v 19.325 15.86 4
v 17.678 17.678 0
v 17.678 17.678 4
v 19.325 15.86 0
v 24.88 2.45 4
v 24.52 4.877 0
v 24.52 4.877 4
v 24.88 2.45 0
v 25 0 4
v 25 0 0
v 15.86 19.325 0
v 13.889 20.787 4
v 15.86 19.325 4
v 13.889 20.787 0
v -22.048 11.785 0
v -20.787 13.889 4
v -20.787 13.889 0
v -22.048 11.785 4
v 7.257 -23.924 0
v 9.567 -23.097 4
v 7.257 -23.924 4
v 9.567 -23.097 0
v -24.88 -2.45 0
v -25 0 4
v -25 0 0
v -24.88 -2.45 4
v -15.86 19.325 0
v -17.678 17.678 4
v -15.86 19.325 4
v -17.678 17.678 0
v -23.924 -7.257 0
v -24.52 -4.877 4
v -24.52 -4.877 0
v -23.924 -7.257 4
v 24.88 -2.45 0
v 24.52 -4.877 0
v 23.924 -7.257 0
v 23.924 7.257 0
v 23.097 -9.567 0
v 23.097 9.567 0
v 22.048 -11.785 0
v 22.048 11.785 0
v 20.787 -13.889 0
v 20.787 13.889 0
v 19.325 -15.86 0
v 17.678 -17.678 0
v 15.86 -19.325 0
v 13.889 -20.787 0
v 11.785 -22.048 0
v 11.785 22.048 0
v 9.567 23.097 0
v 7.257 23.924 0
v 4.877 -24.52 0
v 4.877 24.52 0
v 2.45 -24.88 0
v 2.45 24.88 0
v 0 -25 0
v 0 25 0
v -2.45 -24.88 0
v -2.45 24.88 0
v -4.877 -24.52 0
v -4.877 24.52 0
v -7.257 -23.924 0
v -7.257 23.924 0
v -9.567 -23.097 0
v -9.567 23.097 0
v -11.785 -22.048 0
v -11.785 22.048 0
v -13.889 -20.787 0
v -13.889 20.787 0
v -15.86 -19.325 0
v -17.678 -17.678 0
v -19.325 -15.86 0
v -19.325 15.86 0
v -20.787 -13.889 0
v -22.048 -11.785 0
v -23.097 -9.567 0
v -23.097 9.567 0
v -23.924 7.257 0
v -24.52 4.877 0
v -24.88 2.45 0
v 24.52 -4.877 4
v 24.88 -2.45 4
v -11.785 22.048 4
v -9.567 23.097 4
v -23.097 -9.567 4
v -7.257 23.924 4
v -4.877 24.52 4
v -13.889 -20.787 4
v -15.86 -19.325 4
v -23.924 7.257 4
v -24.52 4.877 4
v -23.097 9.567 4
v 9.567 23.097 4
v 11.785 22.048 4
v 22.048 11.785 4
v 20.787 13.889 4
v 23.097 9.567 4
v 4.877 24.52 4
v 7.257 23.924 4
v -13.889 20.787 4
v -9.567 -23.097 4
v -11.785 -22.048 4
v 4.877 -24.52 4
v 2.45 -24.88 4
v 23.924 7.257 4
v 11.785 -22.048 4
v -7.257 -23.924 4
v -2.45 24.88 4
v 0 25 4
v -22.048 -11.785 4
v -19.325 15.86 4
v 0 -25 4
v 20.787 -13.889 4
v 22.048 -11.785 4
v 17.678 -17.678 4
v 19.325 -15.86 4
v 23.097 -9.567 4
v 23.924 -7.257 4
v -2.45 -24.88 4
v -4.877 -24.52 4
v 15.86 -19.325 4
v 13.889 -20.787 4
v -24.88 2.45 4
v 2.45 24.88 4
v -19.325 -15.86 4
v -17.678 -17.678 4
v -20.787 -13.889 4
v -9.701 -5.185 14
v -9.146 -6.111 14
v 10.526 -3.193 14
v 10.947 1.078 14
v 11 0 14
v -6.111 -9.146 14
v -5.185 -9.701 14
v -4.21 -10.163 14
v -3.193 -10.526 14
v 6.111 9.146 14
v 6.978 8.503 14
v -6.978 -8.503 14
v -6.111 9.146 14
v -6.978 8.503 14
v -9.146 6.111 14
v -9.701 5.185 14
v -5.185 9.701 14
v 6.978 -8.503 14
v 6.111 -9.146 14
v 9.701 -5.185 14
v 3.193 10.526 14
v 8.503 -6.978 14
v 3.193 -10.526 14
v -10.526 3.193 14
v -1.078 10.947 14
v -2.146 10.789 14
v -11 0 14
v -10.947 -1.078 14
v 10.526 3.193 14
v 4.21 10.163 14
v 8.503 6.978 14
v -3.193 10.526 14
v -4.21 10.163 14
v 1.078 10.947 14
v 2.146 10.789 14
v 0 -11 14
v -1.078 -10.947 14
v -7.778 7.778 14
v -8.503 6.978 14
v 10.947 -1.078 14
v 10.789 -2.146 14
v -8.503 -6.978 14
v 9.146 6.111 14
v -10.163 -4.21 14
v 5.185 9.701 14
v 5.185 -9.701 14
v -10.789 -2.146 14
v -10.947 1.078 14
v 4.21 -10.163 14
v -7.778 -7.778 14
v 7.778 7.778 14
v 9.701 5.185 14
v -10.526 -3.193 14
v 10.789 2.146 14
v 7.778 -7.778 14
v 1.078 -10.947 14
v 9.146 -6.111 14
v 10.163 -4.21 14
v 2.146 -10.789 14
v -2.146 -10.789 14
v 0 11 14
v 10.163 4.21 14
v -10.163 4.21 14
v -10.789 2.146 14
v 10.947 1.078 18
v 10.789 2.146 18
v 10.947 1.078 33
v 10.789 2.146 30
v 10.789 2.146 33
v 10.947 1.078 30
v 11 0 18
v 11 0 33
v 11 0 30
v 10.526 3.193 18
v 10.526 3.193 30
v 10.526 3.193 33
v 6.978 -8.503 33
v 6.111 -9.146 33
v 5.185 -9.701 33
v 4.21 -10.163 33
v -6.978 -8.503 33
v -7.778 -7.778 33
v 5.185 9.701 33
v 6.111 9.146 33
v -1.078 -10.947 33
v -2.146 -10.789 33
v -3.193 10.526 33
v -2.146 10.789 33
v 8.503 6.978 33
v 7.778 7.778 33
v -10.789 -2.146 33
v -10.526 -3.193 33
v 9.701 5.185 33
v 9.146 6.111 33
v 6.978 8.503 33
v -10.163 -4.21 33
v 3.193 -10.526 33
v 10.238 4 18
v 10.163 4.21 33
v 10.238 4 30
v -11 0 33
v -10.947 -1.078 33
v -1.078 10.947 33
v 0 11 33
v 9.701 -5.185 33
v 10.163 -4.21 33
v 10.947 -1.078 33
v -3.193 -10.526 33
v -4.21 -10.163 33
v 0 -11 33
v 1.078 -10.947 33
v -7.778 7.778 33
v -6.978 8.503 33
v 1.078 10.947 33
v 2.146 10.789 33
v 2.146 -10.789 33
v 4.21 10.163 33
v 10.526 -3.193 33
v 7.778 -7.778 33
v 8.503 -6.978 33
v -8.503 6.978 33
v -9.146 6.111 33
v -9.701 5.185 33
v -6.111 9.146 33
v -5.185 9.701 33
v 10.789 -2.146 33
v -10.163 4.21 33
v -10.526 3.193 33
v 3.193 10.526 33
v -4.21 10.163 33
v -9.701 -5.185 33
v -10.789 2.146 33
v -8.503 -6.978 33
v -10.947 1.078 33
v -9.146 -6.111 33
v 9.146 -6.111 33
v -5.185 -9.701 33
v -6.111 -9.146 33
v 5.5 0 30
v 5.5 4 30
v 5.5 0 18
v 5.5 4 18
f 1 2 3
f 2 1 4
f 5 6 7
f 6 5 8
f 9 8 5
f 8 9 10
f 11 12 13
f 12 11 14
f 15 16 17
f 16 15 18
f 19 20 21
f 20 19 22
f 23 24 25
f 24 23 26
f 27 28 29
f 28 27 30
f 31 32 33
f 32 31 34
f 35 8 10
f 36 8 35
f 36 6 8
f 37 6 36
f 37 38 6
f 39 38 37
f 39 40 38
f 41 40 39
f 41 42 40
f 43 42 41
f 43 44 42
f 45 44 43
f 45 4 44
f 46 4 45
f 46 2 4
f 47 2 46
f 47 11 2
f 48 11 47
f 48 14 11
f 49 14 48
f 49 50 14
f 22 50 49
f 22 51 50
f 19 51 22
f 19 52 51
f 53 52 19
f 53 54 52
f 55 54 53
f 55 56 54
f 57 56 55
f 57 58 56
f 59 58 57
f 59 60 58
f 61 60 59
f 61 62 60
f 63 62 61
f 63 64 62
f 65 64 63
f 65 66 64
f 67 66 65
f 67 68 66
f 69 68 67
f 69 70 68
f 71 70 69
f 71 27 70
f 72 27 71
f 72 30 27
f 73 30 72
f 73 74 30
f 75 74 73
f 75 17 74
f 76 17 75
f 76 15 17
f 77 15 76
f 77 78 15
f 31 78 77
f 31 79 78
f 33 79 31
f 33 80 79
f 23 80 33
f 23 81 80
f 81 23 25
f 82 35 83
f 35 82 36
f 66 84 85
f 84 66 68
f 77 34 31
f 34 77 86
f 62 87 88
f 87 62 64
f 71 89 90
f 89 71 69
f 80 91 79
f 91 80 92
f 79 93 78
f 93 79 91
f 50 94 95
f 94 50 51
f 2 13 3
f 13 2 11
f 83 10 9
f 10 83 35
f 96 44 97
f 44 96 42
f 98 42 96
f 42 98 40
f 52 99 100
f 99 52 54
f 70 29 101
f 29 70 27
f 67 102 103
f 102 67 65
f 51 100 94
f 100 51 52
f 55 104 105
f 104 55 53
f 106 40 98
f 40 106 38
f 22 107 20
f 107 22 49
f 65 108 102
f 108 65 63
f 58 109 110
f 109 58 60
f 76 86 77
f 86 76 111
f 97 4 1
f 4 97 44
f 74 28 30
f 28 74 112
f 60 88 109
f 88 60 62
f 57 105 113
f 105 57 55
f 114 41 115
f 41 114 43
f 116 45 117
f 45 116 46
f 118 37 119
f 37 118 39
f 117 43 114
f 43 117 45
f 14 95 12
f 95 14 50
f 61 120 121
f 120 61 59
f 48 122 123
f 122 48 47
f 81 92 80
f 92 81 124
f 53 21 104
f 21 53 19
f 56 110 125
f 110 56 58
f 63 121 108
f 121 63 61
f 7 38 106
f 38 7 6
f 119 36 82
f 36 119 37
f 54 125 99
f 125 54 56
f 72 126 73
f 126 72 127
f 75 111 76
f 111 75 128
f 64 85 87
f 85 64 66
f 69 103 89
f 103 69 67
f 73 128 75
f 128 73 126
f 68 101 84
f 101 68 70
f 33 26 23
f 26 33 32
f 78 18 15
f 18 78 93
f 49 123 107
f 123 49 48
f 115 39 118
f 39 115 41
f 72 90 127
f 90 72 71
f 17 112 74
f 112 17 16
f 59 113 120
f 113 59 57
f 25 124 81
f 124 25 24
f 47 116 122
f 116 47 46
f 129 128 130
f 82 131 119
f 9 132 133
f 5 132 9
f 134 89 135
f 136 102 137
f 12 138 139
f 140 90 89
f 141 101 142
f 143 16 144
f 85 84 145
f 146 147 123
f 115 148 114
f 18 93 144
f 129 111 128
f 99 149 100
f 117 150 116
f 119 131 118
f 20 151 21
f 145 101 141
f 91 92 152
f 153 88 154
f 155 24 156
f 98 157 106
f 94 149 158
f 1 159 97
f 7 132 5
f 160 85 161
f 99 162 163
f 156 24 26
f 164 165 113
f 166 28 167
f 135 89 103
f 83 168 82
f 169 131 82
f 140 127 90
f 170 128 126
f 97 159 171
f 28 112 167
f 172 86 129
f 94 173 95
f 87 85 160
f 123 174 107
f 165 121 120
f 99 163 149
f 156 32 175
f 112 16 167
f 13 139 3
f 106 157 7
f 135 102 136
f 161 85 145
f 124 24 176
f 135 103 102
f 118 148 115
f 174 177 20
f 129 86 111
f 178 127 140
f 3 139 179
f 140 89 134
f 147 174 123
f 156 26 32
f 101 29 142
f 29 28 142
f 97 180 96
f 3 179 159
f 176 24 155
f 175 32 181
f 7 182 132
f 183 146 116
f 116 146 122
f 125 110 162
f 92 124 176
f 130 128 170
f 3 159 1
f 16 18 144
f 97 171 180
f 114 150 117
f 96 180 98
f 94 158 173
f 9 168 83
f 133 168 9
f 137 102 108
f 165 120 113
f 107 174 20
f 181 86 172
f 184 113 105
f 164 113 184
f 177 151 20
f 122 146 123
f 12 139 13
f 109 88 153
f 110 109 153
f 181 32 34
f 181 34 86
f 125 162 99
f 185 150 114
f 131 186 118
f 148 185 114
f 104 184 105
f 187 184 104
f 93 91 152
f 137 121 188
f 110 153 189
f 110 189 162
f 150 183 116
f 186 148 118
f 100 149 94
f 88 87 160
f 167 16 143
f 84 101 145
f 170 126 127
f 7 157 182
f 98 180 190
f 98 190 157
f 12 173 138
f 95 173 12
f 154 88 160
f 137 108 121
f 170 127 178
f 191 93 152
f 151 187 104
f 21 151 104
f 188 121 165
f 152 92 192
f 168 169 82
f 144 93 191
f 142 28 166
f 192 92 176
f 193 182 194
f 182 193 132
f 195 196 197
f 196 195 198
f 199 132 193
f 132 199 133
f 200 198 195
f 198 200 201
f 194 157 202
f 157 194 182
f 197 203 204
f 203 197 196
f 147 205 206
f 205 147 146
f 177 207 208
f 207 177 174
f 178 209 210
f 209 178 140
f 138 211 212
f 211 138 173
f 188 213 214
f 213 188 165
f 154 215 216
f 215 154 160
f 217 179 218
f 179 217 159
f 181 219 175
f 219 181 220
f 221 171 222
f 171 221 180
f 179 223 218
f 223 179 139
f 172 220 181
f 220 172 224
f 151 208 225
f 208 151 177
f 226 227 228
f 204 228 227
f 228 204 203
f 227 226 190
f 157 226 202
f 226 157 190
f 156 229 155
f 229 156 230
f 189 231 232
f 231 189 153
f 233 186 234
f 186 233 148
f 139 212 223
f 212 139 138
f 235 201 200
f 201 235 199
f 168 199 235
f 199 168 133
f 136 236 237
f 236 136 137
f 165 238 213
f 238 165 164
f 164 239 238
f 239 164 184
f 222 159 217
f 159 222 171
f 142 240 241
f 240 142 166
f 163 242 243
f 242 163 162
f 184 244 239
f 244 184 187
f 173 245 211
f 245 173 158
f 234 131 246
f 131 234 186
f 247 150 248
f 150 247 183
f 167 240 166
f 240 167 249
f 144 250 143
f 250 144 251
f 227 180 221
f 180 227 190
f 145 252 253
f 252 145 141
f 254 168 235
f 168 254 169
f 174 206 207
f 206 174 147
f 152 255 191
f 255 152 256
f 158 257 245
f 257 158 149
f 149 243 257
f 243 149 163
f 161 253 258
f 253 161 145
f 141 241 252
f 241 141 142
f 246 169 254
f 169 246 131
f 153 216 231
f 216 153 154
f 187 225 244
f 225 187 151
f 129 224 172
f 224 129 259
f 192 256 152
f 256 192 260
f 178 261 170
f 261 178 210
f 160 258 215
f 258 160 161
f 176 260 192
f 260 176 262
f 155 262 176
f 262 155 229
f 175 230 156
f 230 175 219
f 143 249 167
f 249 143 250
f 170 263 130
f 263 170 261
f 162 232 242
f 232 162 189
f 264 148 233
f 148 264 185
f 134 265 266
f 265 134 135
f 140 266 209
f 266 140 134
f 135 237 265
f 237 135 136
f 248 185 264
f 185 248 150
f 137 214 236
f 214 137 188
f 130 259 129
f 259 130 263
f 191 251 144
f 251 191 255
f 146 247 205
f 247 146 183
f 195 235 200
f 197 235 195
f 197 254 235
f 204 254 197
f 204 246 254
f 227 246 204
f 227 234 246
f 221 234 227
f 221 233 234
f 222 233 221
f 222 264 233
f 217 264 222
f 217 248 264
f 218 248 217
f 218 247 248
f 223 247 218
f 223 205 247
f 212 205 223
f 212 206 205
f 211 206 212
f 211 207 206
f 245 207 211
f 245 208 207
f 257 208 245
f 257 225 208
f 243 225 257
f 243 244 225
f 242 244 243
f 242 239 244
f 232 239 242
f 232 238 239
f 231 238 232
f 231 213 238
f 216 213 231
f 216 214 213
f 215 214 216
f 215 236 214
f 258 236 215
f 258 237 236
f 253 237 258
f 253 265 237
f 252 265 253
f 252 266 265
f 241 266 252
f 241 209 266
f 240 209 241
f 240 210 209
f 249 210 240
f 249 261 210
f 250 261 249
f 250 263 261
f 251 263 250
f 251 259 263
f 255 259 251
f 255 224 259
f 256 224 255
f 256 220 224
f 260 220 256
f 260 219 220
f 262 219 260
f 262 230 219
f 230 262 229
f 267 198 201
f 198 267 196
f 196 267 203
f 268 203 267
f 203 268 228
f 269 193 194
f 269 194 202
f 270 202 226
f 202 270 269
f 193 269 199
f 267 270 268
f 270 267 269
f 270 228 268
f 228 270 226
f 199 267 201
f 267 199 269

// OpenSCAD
// 1.5 mL microcentrifuge tube stand for analytical balance
// Print orientation: standing up, base on XY plane at z=0, centred on origin.

// ---- Dimensions (mm) ----
base_diameter   = 50;   // base disc diameter
base_height     = 4;    // base disc height (z = 0..4)
cone_top_diam   = 22;   // cone top diameter at z=14
cone_top_z      = 14;   // cone top height
column_diameter = 22;   // column diameter
column_top_z    = 33;   // column top height
seat_diameter   = 11;   // tube seat diameter
seat_bottom_z   = 23;   // seat bottom height
tip_diameter    = 3;    // tube tip diameter
tip_bottom_z    = 6;    // tip cone bottom height
window_width    = 4;    // viewing window width in Y
window_bottom_z = 18;   // window bottom height
window_top_z    = 30;   // window top height
cut_margin      = 1;    // extra mm for clean cuts

$fn = 64;               // resolution for curved shapes

// ---- Build the solid ----
// Base disc (z = 0..4)
// Cone (z = 4..14)
// Column (z = 14..33)
// Tube seat (z = 23..33)
// Tube tip cone (z = 6..23)
// Viewing window cut (z = 18..30, +X side)

difference() {
    // Solid
    union() {
        // Base disc
        cylinder(h = base_height, d = base_diameter);

        // Cone
        translate([0, 0, base_height])
            cylinder(h = cone_top_z - base_height,
                     d1 = base_diameter,
                     d2 = cone_top_diam);

        // Column
        translate([0, 0, cone_top_z])
            cylinder(h = column_top_z - cone_top_z,
                     d = column_diameter);

        // Tube seat
        translate([0, 0, seat_bottom_z])
            cylinder(h = column_top_z - seat_bottom_z,
                     d = seat_diameter);

        // Tube tip cone
        translate([0, 0, tip_bottom_z])
            cylinder(h = seat_bottom_z - tip_bottom_z,
                     d1 = tip_diameter,
                     d2 = seat_diameter);
    }

    // Viewing window cut
    // The window is on the +X side, so it starts at x = seat_diameter/2
    // and extends to x = column_diameter/2 + cut_margin.
    // It is centred in Y at 0, width = window_width.
    // It spans z from window_bottom_z to window_top_z.
    translate([seat_diameter/2, 0, window_bottom_z])
        cube([column_diameter/2 - seat_diameter/2 + cut_margin,
              window_width,
              window_top_z - window_bottom_z]);
}
